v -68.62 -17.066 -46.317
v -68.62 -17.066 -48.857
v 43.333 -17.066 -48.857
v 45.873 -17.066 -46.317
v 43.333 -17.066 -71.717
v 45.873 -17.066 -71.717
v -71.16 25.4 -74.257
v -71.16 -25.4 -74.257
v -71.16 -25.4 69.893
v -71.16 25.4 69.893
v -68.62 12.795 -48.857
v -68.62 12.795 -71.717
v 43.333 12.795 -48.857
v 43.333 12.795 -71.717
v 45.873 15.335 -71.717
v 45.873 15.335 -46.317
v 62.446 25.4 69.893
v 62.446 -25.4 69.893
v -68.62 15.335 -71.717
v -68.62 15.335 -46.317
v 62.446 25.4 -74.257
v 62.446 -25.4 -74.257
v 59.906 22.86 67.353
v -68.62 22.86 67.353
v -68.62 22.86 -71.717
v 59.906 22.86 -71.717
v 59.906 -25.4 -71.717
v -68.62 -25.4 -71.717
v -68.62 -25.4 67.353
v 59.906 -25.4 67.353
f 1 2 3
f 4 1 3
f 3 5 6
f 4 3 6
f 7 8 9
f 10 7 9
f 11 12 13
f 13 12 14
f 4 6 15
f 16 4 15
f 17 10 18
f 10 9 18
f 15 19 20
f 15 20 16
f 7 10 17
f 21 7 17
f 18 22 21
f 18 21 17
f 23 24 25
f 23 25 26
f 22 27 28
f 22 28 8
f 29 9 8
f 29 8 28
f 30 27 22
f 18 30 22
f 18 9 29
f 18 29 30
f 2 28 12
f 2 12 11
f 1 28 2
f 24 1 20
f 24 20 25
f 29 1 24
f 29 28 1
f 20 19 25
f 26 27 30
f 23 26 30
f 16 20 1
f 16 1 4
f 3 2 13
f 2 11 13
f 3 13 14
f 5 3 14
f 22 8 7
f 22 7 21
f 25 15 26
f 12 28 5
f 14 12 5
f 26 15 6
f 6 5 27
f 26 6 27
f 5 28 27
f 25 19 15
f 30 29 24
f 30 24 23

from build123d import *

# Parameters (mm, degrees)
F0_W          = 133.6063072085
F0_H          = 144.1496908665
F1_DEPTH      = 25.4
F1_DEPTH_BACK = 25.4
F2_T          = -2.54
F3_W          = 114.4931351459
F3_H          = 32.4011910707
F4_DEPTH      = 25.4
F5_T          = -2.54


# Not quite as in the source:
# - a shell that OpenCascade refuses in one call is made with other operations: the cavity is built on its own and cut out


with BuildPart() as f1:
    # F0 (on Front) → F1 (new body, two sides)
    with BuildSketch(Plane.XZ) as f1_sk:
        with Locations((-4.3567232788, -2.181828022)):
            Rectangle(F0_W, F0_H)
    extrude(amount=F1_DEPTH)
    extrude(f1_sk.sketch, amount=-F1_DEPTH_BACK)

    # F2
    f2_openings = [f1.faces().sort_by_distance(p)[0] for p in [
        (-4.356723, -25.4, -2.181828),
    ]]
    offset(amount=F2_T, openings=f2_openings)

    # F3 (on face) → F4 (join)
    with BuildSketch(Plane.XY.offset(-71.7166734552)):
        with Locations((-11.3733093101, -0.8654547855)):
            Rectangle(F3_W, F3_H)
    extrude(amount=F4_DEPTH)

    # F5: a shell. OpenCascade refuses it in one call, so the cavity is built on its own and cut out:
    # the body offset inwards by the wall thickness, plus a prism from it out through each open face.
    f5_core = offset(f1.part, amount=F5_T, kind=Kind.INTERSECTION, mode=Mode.PRIVATE)
    f5_exits = [f5_core.faces().sort_by_distance(p)[0] for p in [
        (-12.643309, -14.52605, -60.286673),
    ]]
    add(f5_core, mode=Mode.SUBTRACT)
    extrude(f5_exits, amount=-F5_T, mode=Mode.SUBTRACT)


solid = f1.part
